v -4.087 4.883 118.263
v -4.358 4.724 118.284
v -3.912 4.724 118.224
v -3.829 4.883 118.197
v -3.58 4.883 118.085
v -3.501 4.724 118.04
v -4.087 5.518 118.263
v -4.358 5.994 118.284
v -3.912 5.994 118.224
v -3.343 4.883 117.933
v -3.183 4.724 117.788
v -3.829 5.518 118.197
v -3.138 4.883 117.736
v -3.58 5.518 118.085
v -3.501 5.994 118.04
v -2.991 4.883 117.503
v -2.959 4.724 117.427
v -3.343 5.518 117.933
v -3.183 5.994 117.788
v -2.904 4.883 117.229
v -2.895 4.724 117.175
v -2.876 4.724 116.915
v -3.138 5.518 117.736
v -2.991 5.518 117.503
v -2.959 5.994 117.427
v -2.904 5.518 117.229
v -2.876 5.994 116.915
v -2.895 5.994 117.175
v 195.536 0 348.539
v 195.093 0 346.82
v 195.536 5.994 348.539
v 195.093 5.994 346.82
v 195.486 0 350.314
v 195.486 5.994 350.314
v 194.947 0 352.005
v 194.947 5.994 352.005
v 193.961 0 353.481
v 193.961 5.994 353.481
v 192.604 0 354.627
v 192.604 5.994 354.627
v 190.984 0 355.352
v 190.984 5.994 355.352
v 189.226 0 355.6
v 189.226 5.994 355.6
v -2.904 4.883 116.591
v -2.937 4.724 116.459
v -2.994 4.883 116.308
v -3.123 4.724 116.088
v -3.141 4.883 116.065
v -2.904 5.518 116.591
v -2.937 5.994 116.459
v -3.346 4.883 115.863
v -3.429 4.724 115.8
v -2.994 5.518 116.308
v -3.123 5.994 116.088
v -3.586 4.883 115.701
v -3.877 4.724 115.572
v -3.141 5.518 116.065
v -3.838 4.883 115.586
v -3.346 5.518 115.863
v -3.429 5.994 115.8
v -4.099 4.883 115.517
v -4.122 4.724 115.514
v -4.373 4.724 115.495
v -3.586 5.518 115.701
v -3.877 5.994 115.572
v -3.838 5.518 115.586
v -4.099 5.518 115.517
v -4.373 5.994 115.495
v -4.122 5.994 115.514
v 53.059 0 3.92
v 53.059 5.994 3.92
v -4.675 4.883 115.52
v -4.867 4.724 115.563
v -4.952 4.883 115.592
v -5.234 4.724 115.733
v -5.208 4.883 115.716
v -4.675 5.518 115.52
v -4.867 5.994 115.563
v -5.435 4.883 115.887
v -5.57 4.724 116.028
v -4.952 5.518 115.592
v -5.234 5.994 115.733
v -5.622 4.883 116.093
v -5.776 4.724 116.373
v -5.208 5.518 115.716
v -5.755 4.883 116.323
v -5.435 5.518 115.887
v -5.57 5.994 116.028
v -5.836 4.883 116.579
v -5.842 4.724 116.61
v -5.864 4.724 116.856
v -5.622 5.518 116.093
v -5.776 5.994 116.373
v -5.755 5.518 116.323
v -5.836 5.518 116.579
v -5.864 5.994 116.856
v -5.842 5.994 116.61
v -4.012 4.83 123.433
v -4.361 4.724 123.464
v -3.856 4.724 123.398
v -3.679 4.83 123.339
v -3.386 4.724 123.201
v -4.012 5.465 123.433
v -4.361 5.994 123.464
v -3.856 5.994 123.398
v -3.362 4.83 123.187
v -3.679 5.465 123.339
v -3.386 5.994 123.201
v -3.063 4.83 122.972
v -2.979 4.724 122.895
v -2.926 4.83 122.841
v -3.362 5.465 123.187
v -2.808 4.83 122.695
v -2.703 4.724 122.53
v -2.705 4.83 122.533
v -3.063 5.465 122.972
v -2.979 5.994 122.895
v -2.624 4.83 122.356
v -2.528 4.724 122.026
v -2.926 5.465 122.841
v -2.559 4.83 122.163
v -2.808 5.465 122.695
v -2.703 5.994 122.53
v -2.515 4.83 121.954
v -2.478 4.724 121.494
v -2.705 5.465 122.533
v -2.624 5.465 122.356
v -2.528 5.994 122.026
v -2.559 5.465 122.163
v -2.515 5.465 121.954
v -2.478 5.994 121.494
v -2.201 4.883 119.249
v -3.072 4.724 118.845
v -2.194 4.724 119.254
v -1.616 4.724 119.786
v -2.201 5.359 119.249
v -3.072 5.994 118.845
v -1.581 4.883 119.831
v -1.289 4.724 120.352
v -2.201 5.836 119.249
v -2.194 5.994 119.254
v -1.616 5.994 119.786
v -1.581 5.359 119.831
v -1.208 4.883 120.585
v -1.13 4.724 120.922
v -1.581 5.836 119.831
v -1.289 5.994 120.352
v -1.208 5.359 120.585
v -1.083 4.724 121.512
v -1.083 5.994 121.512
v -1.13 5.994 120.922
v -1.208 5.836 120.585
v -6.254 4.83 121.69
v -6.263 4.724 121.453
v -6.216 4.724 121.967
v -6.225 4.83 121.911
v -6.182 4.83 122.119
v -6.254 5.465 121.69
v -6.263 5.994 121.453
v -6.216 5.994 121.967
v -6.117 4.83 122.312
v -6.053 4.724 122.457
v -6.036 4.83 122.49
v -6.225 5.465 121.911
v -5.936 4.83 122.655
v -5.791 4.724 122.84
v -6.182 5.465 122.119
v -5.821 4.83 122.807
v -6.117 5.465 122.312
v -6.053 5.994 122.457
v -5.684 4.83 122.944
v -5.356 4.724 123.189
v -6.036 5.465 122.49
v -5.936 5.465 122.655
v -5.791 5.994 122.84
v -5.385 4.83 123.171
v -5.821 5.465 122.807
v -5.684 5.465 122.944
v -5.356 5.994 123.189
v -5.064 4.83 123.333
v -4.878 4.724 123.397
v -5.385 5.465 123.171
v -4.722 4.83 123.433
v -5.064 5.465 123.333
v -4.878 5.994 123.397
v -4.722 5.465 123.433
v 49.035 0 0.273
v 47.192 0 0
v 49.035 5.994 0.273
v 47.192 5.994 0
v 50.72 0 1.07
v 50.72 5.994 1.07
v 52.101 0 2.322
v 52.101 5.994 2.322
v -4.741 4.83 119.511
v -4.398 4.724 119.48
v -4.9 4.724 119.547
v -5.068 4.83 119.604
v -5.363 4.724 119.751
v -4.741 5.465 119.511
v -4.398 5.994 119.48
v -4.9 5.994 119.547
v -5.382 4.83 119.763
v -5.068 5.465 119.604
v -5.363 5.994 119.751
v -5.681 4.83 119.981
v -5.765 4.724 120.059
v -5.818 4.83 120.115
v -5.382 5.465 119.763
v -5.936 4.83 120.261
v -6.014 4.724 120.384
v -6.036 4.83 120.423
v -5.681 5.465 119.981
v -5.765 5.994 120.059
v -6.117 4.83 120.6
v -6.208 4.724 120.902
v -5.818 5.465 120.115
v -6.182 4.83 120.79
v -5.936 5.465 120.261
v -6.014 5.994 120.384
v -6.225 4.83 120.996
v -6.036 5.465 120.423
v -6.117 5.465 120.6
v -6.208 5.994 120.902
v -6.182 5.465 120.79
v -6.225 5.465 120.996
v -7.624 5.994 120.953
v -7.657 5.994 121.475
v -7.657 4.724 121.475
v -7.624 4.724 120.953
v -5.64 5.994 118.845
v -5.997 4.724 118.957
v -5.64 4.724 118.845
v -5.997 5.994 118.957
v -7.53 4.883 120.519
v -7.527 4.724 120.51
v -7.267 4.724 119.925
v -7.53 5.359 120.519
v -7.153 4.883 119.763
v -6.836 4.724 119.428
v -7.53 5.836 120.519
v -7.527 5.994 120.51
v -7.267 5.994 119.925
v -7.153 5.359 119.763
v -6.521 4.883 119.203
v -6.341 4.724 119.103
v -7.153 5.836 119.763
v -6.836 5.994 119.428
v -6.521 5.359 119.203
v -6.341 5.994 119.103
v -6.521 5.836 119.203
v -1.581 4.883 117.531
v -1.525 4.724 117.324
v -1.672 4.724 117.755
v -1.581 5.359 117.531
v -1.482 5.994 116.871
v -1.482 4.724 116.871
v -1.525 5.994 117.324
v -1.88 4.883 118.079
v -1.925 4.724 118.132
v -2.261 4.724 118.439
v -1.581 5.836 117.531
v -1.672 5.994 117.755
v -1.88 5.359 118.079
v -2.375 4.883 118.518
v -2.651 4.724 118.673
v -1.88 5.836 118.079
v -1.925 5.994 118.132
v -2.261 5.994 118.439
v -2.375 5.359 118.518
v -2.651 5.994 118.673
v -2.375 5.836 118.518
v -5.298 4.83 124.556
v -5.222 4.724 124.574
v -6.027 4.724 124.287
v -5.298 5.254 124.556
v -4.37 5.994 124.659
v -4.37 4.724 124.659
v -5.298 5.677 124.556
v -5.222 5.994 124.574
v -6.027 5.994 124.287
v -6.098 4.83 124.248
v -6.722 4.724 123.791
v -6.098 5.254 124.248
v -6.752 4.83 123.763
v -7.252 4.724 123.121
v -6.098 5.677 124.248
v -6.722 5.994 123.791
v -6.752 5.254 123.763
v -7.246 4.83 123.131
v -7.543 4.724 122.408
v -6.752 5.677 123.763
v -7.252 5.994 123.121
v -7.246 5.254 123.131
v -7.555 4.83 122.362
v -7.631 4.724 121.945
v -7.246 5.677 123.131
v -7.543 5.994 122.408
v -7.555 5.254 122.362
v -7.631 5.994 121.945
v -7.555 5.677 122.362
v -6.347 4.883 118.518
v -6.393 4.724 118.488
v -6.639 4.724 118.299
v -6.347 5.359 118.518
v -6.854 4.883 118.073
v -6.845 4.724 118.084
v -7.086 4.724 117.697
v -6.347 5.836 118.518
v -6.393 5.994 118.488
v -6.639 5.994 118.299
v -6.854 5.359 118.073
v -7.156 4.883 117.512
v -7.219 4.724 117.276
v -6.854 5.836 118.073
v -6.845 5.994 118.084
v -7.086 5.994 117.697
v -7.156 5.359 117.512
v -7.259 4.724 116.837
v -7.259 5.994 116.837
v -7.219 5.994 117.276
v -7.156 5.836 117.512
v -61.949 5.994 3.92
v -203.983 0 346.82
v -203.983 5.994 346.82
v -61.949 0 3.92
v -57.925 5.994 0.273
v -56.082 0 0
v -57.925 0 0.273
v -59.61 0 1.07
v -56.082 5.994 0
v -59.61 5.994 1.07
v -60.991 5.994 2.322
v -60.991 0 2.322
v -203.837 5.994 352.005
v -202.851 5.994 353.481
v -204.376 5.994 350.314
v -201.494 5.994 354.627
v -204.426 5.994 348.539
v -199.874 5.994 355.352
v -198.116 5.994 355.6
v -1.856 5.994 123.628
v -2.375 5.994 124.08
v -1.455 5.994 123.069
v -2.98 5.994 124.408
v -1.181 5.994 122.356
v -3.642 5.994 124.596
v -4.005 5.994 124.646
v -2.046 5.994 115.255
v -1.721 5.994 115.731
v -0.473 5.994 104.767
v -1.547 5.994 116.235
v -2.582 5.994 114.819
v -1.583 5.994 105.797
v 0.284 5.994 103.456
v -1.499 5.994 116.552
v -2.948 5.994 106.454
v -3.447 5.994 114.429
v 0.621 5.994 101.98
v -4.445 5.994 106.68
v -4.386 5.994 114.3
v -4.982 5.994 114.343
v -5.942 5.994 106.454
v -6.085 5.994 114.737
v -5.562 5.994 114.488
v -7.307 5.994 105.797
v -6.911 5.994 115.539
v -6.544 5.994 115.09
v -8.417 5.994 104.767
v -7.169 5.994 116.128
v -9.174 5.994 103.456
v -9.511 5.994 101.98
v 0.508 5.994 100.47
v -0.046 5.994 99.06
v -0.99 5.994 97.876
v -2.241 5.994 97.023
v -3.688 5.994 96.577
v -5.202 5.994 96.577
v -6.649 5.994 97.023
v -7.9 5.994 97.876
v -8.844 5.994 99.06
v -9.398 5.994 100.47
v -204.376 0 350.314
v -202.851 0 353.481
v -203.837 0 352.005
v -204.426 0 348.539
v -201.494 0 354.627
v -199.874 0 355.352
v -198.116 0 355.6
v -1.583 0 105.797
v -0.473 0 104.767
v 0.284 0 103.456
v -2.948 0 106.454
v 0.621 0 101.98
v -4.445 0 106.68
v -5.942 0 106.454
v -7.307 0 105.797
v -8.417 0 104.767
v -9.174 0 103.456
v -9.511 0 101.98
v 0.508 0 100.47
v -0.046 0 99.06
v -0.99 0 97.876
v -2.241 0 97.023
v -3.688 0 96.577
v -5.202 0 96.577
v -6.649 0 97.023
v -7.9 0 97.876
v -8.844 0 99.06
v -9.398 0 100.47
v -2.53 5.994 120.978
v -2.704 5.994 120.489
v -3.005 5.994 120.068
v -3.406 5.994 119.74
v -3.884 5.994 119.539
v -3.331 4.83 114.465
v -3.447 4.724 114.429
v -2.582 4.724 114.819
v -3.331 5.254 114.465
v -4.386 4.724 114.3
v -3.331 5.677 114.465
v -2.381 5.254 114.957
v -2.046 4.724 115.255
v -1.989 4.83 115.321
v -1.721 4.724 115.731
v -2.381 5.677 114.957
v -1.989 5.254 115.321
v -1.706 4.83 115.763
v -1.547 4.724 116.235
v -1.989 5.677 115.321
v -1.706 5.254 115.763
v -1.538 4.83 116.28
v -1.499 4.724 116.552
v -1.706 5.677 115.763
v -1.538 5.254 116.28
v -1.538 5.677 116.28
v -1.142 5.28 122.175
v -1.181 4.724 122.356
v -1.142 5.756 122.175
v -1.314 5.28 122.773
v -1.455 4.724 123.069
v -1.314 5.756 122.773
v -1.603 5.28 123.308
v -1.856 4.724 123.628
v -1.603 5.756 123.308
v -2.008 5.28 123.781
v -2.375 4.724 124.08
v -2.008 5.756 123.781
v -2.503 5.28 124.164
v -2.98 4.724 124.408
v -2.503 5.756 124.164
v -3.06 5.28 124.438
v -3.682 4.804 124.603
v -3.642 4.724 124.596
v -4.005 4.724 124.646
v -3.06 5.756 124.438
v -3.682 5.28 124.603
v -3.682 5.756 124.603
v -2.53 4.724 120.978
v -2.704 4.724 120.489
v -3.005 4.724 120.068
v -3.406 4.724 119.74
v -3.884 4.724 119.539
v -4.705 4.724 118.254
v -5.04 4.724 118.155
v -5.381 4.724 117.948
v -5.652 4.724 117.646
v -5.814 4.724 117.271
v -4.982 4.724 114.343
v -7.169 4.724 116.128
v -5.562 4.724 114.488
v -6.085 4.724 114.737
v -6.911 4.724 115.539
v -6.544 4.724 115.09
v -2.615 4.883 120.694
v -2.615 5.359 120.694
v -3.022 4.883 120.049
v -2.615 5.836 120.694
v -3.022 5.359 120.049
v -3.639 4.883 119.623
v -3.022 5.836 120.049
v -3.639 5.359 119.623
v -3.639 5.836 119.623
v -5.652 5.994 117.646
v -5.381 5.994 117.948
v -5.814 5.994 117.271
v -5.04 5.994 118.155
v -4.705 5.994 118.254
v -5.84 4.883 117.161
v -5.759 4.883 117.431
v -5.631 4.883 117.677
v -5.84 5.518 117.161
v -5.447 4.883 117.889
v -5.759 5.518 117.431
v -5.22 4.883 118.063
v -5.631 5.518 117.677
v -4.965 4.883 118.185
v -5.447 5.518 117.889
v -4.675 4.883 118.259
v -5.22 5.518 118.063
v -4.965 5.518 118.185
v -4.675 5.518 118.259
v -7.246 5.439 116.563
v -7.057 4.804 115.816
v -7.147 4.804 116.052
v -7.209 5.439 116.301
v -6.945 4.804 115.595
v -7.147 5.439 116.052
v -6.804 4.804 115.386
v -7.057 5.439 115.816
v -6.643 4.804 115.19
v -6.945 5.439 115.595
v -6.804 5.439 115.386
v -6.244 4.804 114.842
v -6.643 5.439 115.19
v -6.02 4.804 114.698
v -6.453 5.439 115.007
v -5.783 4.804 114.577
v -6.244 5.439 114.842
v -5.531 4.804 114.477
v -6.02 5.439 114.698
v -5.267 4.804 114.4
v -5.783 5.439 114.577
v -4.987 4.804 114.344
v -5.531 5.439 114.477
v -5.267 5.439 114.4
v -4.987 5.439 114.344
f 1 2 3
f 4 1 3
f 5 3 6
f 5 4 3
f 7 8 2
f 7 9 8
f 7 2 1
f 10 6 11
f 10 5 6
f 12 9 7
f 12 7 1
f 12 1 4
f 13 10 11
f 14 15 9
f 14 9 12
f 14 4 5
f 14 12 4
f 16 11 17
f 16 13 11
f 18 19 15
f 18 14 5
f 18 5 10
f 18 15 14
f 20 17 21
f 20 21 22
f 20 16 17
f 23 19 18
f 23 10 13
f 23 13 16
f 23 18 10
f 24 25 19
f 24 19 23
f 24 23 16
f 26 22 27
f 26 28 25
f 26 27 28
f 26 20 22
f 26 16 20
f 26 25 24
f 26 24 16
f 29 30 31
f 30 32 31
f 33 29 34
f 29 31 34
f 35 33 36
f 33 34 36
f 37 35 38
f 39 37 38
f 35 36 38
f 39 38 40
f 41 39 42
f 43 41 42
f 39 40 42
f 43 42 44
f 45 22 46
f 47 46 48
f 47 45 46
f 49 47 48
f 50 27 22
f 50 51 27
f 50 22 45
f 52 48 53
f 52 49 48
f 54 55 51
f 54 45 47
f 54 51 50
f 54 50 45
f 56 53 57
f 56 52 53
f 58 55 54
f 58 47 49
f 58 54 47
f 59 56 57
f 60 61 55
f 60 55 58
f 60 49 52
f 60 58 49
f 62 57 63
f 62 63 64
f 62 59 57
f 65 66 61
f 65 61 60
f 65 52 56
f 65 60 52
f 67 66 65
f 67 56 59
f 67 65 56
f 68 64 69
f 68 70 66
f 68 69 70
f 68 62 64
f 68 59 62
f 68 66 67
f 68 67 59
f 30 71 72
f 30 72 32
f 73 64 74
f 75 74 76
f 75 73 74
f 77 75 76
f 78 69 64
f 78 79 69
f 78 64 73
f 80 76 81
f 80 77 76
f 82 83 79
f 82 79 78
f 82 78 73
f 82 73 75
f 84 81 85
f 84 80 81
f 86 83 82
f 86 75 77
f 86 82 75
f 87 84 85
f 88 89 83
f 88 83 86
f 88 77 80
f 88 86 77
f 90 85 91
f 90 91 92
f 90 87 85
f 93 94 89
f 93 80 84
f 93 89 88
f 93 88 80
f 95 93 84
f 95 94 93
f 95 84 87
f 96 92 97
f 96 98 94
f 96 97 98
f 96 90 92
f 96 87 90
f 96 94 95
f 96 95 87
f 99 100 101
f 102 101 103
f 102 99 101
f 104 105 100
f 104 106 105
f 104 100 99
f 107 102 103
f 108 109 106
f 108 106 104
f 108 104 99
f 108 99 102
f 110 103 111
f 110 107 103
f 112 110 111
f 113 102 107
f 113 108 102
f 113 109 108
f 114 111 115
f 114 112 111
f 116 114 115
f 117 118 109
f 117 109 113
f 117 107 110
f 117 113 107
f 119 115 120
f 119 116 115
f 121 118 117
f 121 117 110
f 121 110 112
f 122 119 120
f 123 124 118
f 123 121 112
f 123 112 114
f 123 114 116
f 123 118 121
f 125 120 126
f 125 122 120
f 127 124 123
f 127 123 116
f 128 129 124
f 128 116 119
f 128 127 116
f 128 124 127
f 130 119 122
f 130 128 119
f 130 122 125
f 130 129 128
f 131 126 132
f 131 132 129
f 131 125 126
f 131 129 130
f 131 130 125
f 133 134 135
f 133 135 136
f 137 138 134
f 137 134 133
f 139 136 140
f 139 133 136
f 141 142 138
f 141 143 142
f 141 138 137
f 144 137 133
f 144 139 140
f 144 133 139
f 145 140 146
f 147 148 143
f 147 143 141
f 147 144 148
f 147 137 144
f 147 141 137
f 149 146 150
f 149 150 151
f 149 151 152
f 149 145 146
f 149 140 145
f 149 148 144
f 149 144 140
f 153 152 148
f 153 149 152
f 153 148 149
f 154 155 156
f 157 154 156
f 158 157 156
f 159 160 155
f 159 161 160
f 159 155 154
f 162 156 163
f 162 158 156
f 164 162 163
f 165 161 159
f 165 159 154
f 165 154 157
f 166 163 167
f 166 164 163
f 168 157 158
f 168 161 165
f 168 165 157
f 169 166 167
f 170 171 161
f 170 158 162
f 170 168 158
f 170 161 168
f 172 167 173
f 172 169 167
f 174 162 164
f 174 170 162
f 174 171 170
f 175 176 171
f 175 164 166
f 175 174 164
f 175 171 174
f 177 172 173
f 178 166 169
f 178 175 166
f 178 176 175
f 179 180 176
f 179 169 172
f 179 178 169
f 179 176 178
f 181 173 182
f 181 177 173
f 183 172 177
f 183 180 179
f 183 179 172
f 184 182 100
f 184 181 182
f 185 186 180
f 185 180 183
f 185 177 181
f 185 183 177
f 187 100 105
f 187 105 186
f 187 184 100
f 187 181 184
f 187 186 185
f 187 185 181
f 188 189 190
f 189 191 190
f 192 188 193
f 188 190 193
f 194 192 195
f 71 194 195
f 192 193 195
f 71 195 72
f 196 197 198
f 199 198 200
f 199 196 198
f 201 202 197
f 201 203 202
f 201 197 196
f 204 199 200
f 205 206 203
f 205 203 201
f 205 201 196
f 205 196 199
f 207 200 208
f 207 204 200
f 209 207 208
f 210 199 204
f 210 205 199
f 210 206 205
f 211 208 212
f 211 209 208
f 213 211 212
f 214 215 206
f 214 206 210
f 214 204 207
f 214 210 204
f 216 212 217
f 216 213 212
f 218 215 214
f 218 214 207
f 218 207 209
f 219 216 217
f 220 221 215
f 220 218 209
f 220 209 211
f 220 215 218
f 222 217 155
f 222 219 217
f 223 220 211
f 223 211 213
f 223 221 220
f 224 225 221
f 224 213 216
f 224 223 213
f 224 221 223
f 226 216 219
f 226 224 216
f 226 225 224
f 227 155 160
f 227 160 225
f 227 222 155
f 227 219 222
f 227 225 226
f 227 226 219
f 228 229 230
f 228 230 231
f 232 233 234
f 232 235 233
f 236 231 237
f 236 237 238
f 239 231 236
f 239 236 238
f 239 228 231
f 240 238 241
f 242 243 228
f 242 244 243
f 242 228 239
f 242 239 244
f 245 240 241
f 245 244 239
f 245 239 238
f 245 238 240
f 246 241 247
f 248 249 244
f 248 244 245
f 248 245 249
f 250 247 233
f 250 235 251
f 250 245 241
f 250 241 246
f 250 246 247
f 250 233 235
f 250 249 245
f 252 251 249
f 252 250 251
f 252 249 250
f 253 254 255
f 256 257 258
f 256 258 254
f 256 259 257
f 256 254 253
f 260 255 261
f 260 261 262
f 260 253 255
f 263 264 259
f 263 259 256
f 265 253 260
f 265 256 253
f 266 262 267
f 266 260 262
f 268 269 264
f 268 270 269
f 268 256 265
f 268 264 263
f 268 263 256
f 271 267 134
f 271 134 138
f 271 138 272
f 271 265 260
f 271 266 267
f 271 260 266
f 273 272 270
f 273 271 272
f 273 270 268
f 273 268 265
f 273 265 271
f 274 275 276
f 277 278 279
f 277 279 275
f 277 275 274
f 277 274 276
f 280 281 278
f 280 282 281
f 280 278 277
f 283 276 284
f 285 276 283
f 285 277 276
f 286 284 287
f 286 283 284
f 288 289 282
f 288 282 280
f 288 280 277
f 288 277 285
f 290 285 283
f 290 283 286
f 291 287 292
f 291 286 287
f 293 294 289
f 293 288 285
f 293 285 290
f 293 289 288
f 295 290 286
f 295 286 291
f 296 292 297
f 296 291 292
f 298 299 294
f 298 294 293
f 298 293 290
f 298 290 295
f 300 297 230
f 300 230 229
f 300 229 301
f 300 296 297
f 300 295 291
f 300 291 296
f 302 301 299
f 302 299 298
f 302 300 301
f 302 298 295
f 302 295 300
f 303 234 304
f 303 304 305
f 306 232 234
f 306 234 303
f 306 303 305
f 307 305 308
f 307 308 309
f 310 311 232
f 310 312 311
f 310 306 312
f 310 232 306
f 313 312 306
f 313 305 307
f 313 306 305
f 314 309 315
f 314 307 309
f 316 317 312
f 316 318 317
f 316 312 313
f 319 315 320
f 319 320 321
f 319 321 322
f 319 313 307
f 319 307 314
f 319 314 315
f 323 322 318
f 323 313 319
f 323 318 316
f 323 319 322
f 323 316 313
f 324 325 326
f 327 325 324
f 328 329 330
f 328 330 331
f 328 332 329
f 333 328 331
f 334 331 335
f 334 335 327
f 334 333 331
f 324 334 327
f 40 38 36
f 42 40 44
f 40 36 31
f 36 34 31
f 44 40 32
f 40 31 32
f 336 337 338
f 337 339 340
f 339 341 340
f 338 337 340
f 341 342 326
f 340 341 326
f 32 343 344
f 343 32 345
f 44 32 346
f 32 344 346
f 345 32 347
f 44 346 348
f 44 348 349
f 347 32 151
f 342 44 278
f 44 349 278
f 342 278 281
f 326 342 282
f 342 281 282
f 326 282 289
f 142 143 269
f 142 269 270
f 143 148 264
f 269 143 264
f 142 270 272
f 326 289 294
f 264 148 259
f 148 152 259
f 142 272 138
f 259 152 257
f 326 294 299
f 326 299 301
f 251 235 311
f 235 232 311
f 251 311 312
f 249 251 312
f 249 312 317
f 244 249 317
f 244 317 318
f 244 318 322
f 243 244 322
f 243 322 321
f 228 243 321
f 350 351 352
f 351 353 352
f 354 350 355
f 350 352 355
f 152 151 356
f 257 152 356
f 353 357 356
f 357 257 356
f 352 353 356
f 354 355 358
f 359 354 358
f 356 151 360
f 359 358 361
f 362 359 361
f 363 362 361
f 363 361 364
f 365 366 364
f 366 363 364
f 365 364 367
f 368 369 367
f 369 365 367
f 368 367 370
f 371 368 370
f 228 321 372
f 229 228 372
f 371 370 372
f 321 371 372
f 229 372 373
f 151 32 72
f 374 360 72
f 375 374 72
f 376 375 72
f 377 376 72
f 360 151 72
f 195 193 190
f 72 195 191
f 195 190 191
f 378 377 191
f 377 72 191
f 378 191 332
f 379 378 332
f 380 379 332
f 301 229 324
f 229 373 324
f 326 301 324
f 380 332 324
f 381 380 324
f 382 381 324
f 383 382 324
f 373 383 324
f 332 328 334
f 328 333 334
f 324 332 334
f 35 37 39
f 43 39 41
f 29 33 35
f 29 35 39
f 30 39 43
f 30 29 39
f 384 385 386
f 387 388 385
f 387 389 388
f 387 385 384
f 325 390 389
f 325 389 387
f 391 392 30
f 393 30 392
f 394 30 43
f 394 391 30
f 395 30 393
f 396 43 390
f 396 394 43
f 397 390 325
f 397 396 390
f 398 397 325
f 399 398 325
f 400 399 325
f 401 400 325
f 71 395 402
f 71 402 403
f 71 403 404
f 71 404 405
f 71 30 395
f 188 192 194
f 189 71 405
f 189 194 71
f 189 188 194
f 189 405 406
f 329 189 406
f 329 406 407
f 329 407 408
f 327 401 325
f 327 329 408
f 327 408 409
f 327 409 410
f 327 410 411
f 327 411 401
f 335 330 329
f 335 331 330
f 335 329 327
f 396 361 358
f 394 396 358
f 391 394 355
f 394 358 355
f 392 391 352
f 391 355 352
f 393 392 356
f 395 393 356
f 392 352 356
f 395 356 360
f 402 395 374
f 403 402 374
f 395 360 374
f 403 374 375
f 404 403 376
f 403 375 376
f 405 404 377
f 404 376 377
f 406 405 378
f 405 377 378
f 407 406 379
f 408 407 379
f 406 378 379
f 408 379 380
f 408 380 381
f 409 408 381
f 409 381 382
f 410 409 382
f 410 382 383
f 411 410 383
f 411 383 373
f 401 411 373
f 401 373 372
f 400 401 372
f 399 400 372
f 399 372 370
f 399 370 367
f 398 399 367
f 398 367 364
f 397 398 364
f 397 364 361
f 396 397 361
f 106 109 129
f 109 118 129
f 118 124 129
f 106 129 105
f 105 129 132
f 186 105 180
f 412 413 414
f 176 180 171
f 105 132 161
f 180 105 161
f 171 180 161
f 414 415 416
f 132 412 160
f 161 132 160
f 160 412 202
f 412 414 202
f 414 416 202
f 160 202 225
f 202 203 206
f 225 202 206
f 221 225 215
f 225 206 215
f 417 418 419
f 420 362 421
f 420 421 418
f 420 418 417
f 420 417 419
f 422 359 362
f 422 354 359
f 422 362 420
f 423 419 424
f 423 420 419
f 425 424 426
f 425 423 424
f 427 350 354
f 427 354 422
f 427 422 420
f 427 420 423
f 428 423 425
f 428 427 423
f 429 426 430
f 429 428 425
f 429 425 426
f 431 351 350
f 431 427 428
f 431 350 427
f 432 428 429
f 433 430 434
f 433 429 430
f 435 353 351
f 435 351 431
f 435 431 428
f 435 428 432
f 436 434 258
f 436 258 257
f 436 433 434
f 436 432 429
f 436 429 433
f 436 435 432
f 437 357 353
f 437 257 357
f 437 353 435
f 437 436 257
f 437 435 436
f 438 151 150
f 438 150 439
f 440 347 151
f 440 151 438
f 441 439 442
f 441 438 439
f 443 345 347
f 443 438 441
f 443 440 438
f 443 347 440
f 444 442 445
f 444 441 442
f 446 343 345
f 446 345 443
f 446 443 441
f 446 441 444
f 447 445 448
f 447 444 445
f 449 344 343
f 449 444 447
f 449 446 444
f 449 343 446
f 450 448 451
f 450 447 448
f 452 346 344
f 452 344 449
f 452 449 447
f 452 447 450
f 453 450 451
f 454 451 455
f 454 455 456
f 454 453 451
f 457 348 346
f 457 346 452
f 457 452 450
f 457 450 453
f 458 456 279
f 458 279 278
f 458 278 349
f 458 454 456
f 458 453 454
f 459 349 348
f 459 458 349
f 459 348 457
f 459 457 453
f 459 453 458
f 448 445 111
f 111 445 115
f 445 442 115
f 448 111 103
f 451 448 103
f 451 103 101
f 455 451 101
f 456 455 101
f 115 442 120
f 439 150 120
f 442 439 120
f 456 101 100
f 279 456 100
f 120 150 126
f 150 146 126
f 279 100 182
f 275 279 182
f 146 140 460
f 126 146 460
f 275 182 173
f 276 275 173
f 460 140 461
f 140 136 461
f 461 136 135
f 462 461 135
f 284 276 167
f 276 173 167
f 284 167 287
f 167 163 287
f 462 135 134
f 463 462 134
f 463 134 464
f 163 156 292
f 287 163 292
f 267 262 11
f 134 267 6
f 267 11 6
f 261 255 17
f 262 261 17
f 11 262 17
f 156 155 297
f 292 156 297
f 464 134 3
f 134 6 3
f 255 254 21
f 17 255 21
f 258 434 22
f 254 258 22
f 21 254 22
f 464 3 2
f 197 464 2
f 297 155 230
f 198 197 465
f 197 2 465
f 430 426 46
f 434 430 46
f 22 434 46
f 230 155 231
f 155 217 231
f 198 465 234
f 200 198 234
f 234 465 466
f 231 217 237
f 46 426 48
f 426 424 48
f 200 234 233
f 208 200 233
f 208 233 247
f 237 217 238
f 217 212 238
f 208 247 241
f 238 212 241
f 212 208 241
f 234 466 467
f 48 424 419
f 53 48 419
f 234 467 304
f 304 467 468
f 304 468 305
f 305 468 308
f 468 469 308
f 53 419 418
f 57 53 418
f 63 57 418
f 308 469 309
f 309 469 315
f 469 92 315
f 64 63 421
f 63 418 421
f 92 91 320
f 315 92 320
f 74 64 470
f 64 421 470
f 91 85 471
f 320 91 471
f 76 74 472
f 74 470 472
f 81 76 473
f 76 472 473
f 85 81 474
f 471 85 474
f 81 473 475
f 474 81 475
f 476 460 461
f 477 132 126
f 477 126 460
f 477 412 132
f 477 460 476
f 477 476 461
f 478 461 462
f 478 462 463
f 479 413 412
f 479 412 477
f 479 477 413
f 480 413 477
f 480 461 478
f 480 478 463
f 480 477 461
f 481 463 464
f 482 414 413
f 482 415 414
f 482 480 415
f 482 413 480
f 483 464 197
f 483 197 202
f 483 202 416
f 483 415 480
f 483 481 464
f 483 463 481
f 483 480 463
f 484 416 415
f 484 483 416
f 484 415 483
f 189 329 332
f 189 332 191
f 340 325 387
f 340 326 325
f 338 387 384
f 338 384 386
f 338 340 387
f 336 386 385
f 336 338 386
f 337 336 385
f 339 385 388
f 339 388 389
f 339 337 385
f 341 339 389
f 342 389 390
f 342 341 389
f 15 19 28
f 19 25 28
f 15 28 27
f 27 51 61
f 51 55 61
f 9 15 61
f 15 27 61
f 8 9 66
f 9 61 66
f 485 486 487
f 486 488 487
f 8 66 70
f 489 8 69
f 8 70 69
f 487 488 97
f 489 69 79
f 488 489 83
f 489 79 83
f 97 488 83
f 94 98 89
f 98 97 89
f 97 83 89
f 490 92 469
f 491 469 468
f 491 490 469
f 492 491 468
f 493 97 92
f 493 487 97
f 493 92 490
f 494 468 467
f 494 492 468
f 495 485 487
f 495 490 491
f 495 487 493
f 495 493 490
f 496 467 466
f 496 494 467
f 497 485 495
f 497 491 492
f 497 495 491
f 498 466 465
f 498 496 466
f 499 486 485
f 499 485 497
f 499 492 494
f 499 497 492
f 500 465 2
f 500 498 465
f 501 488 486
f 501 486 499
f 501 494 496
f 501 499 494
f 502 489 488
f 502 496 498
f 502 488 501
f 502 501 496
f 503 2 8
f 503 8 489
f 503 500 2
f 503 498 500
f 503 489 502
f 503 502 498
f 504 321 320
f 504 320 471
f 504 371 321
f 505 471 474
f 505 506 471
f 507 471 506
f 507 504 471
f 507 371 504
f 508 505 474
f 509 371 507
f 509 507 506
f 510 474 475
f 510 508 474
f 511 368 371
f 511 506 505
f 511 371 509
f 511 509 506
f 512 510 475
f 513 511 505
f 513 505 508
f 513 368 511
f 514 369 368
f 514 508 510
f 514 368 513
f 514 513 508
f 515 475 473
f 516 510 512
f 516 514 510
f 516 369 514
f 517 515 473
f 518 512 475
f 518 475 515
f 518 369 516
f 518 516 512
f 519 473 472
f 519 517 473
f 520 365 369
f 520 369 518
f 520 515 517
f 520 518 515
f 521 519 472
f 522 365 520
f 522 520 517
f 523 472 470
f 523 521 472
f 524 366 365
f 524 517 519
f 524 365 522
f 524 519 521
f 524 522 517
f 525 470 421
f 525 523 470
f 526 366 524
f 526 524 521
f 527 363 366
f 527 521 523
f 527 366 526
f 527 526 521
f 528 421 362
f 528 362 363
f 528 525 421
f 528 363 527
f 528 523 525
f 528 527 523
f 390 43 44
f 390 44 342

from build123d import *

# Parameters (mm, degrees)
BOSS_EXTRUDE1_DEPTH = 5.9944
SKETCH2_R           = 5.08
CUT_EXTRUDE1_DEPTH  = 412.816809185
CUT_EXTRUDE2_DEPTH  = 1.27
FILLET1_R           = 6.35


with BuildPart() as part:
    # Sketch1 → Boss-Extrude1 (new body)
    with BuildSketch(Plane(origin=(0, 0, 0), x_dir=(1, 0, 0), z_dir=(0, 1, 0))):
        Polygon((-60.325, 0), (51.435, 0), (198.72934278, -355.6), (-207.61934278, -355.6), align=None)
    extrude(amount=BOSS_EXTRUDE1_DEPTH)

    # Sketch2 → Cut-Extrude1 (cut, through all)
    with BuildSketch(Plane(origin=(0, 5.9944, 0), x_dir=(1, 0, 0), z_dir=(0, 1, 0))):
        with Locations(Location((-4.445, -101.6, 0), (0, 0, 270))):
            Circle(SKETCH2_R)
    extrude(amount=-CUT_EXTRUDE1_DEPTH, mode=Mode.SUBTRACT)

    # Sketch3 → Cut-Extrude2 (cut)
    with BuildSketch(Plane(origin=(0, 5.9944, 0), x_dir=(1, 0, 0), z_dir=(0, 1, 0))):
        with BuildLine():
            add(Edge.make_bspline(
                [(-5.640294118, -118.844607843), (-5.768281461, -118.7980584), (-6.012903349, -118.709088566), (-6.344808892, -118.528644016), (-6.628148212, -118.321295156), (-6.859224633, -118.080893307), (-7.042120778, -117.812676631), (-7.164700527, -117.51094663), (-7.246991297, -117.183653612), (-7.254869453, -116.9546664), (-7.258921569, -116.836887255)],
                knots=[0, 0, 0, 0, 1.173413012, 2.242741344, 3.246972854, 4.190159209, 5.106157181, 6.028734337, 6.986083187, 8, 8, 8, 8], degree=3))
            add(Edge.make_bspline(
                [(-7.258921569, -116.836887255), (-7.256653552, -116.74543812), (-7.252200886, -116.565901343), (-7.213482148, -116.303182669), (-7.152660448, -116.051861575), (-7.060728999, -115.816064709), (-6.94901075, -115.590943888), (-6.806603031, -115.383438523), (-6.644343219, -115.184183893), (-6.45490221, -115.003149717), (-6.246885977, -114.837793075), (-6.022041475, -114.69497982), (-5.7838008, -114.572137861), (-5.531145358, -114.473110122), (-5.264549685, -114.394868468), (-4.984496654, -114.338509959), (-4.689484701, -114.308439202), (-4.488640248, -114.302856801), (-4.385857843, -114.3)],
                knots=[0, 0, 0, 0, 1.020607516, 2.003699488, 2.959093155, 3.90154348, 4.82383827, 5.758924752, 6.705354677, 7.688583181, 8.678343028, 9.668238486, 10.65793052, 11.666964273, 12.693473199, 13.756849753, 14.852065001, 16, 16, 16, 16], degree=3))
            add(Edge.make_bspline(
                [(-4.385857843, -114.3), (-4.204545978, -114.307182695), (-3.846812052, -114.321354376), (-3.325593417, -114.452611845), (-2.831953616, -114.659661213), (-2.448510098, -114.897294215), (-2.168676808, -115.124039422), (-1.984603203, -115.31762303), (-1.82878598, -115.529848563), (-1.699174378, -115.761340468), (-1.604276743, -116.013935686), (-1.53070498, -116.282355633), (-1.491818503, -116.571186294), (-1.485111623, -116.769344483), (-1.481666667, -116.871127451)],
                knots=[0, 0, 0, 0, 1.49991019, 2.959369276, 4.423378123, 5.921390363, 6.678638349, 7.402202754, 8.127755887, 8.854987543, 9.592510724, 10.357767003, 11.156475192, 12, 12, 12, 12], degree=3))
            add(Edge.make_bspline(
                [(-1.481666667, -116.871127451), (-1.485981374, -116.986769655), (-1.494320954, -117.210285987), (-1.572283013, -117.531243569), (-1.696017648, -117.824461788), (-1.875697281, -118.087738493), (-2.102550457, -118.322461305), (-2.37847657, -118.530388471), (-2.705170536, -118.708248837), (-2.946454343, -118.79787135), (-3.072279412, -118.844607843)],
                knots=[0, 0, 0, 0, 1.014624892, 1.96109401, 2.884086684, 3.796937268, 4.744810514, 5.74041467, 6.821667794, 8, 8, 8, 8], degree=3))
            add(Edge.make_bspline(
                [(-3.072279412, -118.844607843), (-2.914859742, -118.900489884), (-2.611977915, -119.008009197), (-2.201301068, -119.233230072), (-1.85753283, -119.508365329), (-1.571190747, -119.822675989), (-1.3501441, -120.184044387), (-1.194321746, -120.588929683), (-1.099246075, -121.036791949), (-1.088702629, -121.349878452), (-1.083235294, -121.512230392)],
                knots=[0, 0, 0, 0, 1.112885226, 2.141236288, 3.106314107, 4.037297253, 4.963019108, 5.91395125, 6.9182732, 8, 8, 8, 8], degree=3))
            add(Edge.make_bspline(
                [(-1.083235294, -121.512230392), (-1.086318941, -121.625474405), (-1.092368202, -121.847627831), (-1.137118864, -122.172750949), (-1.207746531, -122.481606909), (-1.308423274, -122.77502823), (-1.438648283, -123.051876406), (-1.600417225, -123.312302358), (-1.786045911, -123.560068261), (-2.004820521, -123.784957815), (-2.242643145, -123.990398791), (-2.500313239, -124.167920217), (-2.770635203, -124.32272247), (-3.061103925, -124.443446772), (-3.365060773, -124.540441866), (-3.686334259, -124.607785027), (-4.022388276, -124.65413566), (-4.252883136, -124.657501283), (-4.370294118, -124.659215686)],
                knots=[0, 0, 0, 0, 1.064292101, 2.08784667, 3.079199066, 4.038508011, 4.998411814, 5.948603018, 6.916206708, 7.902700801, 8.891891554, 9.865962993, 10.839887915, 11.814545202, 12.81711046, 13.834885875, 14.897119988, 16, 16, 16, 16], degree=3))
            add(Edge.make_bspline(
                [(-4.370294118, -124.659215686), (-4.530450496, -124.655055295), (-4.842398953, -124.646951791), (-5.293729483, -124.565960727), (-5.71503222, -124.441015444), (-6.099384044, -124.257093489), (-6.449092805, -124.034776245), (-6.756260599, -123.768991245), (-7.028635641, -123.471514872), (-7.2545707, -123.134254948), (-7.439104567, -122.764001399), (-7.56324669, -122.360000473), (-7.645470959, -121.927477068), (-7.653310887, -121.628844365), (-7.657352941, -121.474877451)],
                knots=[0, 0, 0, 0, 1.120474225, 2.182430745, 3.200631737, 4.18872885, 5.15617281, 6.094022942, 7.025121698, 7.972298329, 8.92766112, 9.911179284, 10.92306075, 12, 12, 12, 12], degree=3))
            add(Edge.make_bspline(
                [(-7.657352941, -121.474877451), (-7.652474419, -121.306189583), (-7.643139125, -120.983396938), (-7.542148126, -120.525386814), (-7.390372291, -120.11345735), (-7.162821914, -119.754925593), (-6.875293668, -119.443678395), (-6.520899225, -119.188042681), (-6.1048536, -118.982176757), (-5.79972148, -118.891818695), (-5.640294118, -118.844607843)],
                knots=[0, 0, 0, 0, 1.117326705, 2.138060355, 3.0968872, 4.015582046, 4.936209226, 5.891768515, 6.898477863, 8, 8, 8, 8], degree=3))
        make_face()
        with BuildLine():
            add(Edge.make_bspline(
                [(-5.864411765, -116.855563725), (-5.860924518, -116.958010868), (-5.854216871, -117.155065791), (-5.765784417, -117.432384032), (-5.640947106, -117.685224799), (-5.451456684, -117.896691957), (-5.226791082, -118.071851556), (-4.962683383, -118.194777943), (-4.670317297, -118.271397042), (-4.464171965, -118.279918431), (-4.357843137, -118.284313725)],
                knots=[0, 0, 0, 0, 1.049749877, 2.019171811, 2.969415362, 3.930571672, 4.912841927, 5.882263861, 6.9076813, 8, 8, 8, 8], degree=3))
            add(Edge.make_bspline(
                [(-4.357843137, -118.284313725), (-4.267190664, -118.280193467), (-4.087615794, -118.272031584), (-3.823719553, -118.203958648), (-3.574222101, -118.089196592), (-3.337369037, -117.939101774), (-3.129857845, -117.746660089), (-2.978959746, -117.504417071), (-2.889286093, -117.221730721), (-2.880680381, -117.020186607), (-2.876176471, -116.914705882)],
                knots=[0, 0, 0, 0, 0.963702045, 1.909012115, 2.877635224, 3.876069072, 4.883498001, 5.860766905, 6.880404623, 8, 8, 8, 8], degree=3))
            add(Edge.make_bspline(
                [(-2.876176471, -116.914705882), (-2.880320884, -116.806003587), (-2.888257178, -116.597845456), (-2.982975445, -116.307569109), (-3.13119673, -116.055199378), (-3.34173584, -115.85609348), (-3.578520019, -115.695862312), (-3.83314048, -115.57939674), (-4.099621151, -115.506701151), (-4.28164435, -115.49911732), (-4.373406863, -115.495294118)],
                knots=[0, 0, 0, 0, 1.127500904, 2.159094072, 3.142695739, 4.143230944, 5.146793142, 6.108626903, 7.046510837, 8, 8, 8, 8], degree=3))
            add(Edge.make_bspline(
                [(-4.373406863, -115.495294118), (-4.474474554, -115.500065785), (-4.670996862, -115.509344111), (-4.955160717, -115.582421103), (-5.212606095, -115.70863905), (-5.438689503, -115.879739544), (-5.62744998, -116.08395805), (-5.764312365, -116.319650961), (-5.848604785, -116.580214386), (-5.859074542, -116.762592094), (-5.864411765, -116.855563725)],
                knots=[0, 0, 0, 0, 1.078218644, 2.096555407, 3.107271322, 4.119806927, 5.107928669, 6.056056474, 7.009025814, 8, 8, 8, 8], degree=3))
        make_face(mode=Mode.SUBTRACT)
        with BuildLine():
            add(Edge.make_bspline(
                [(-6.262843137, -121.453088235), (-6.261298067, -121.532062003), (-6.258299158, -121.685346403), (-6.227977336, -121.907756099), (-6.187633061, -122.117531737), (-6.120192673, -122.310529782), (-6.039744497, -122.490957051), (-5.938476689, -122.65557316), (-5.82434678, -122.811352176), (-5.641910932, -122.988161746), (-5.395980801, -123.178617287), (-5.069204271, -123.342051313), (-4.722376449, -123.44821201), (-4.482077929, -123.45865686), (-4.360955882, -123.463921569)],
                knots=[0, 0, 0, 0, 0.915735869, 1.777400627, 2.601488155, 3.389611073, 4.143901115, 4.889298653, 5.628545054, 6.377725128, 7.829754517, 9.21892808, 10.59820559, 12, 12, 12, 12], degree=3))
            add(Edge.make_bspline(
                [(-4.360955882, -123.463921569), (-4.244070539, -123.45814149), (-4.011671439, -123.44664916), (-3.673723511, -123.347249825), (-3.351752928, -123.193652736), (-3.104787343, -123.014894989), (-2.92282109, -122.844840257), (-2.804586484, -122.695868496), (-2.699780546, -122.534741789), (-2.62065757, -122.353962845), (-2.552880219, -122.16115171), (-2.512632107, -121.951322958), (-2.482143549, -121.727898463), (-2.479246916, -121.573569079), (-2.477745098, -121.493553922)],
                knots=[0, 0, 0, 0, 1.37269116, 2.72927453, 4.110677498, 5.553914238, 6.296474074, 7.034302579, 7.786136671, 8.550941152, 9.350050124, 10.185625034, 11.059300983, 12, 12, 12, 12], degree=3))
            add(Edge.make_bspline(
                [(-2.477745098, -121.493553922), (-2.483630192, -121.352722772), (-2.495006597, -121.080483782), (-2.60268714, -120.693302545), (-2.770681208, -120.341906837), (-3.013921411, -120.042681729), (-3.300915016, -119.790113634), (-3.635707493, -119.611392315), (-4.00477824, -119.495591574), (-4.264597088, -119.485038711), (-4.398308824, -119.479607843)],
                knots=[0, 0, 0, 0, 1.083575586, 2.094646838, 3.074961835, 4.065731916, 5.047123519, 6.002911055, 6.972229185, 8, 8, 8, 8], degree=3))
            add(Edge.make_bspline(
                [(-4.398308824, -119.479607843), (-4.51307051, -119.48550344), (-4.741293091, -119.497227809), (-5.075791284, -119.595526955), (-5.391477394, -119.758351267), (-5.640183053, -119.936812163), (-5.819703541, -120.111248651), (-5.939709917, -120.259029867), (-6.040242629, -120.422270239), (-6.119512002, -120.601057575), (-6.187716213, -120.79166566), (-6.228262868, -120.999410109), (-6.258258414, -121.220834879), (-6.261284213, -121.374116104), (-6.262843137, -121.453088235)],
                knots=[0, 0, 0, 0, 1.356797633, 2.69821633, 4.088085986, 5.54754192, 6.303274427, 7.045712095, 7.79573256, 8.565314721, 9.357790869, 10.186565194, 11.065698936, 12, 12, 12, 12], degree=3))
        make_face(mode=Mode.SUBTRACT)
    extrude(amount=-CUT_EXTRUDE2_DEPTH, mode=Mode.SUBTRACT)

    # Fillet1
    fillet1_edges = [part.edges().sort_by_distance(p)[0] for p in [
        (198.72934278, 2.9972, 355.6),
        (-207.61934278, 2.9972, 355.6),
        (-60.325, 2.9972, 0),
        (51.435, 2.9972, 0),
    ]]
    fillet(fillet1_edges, radius=FILLET1_R)


solid = part.part
